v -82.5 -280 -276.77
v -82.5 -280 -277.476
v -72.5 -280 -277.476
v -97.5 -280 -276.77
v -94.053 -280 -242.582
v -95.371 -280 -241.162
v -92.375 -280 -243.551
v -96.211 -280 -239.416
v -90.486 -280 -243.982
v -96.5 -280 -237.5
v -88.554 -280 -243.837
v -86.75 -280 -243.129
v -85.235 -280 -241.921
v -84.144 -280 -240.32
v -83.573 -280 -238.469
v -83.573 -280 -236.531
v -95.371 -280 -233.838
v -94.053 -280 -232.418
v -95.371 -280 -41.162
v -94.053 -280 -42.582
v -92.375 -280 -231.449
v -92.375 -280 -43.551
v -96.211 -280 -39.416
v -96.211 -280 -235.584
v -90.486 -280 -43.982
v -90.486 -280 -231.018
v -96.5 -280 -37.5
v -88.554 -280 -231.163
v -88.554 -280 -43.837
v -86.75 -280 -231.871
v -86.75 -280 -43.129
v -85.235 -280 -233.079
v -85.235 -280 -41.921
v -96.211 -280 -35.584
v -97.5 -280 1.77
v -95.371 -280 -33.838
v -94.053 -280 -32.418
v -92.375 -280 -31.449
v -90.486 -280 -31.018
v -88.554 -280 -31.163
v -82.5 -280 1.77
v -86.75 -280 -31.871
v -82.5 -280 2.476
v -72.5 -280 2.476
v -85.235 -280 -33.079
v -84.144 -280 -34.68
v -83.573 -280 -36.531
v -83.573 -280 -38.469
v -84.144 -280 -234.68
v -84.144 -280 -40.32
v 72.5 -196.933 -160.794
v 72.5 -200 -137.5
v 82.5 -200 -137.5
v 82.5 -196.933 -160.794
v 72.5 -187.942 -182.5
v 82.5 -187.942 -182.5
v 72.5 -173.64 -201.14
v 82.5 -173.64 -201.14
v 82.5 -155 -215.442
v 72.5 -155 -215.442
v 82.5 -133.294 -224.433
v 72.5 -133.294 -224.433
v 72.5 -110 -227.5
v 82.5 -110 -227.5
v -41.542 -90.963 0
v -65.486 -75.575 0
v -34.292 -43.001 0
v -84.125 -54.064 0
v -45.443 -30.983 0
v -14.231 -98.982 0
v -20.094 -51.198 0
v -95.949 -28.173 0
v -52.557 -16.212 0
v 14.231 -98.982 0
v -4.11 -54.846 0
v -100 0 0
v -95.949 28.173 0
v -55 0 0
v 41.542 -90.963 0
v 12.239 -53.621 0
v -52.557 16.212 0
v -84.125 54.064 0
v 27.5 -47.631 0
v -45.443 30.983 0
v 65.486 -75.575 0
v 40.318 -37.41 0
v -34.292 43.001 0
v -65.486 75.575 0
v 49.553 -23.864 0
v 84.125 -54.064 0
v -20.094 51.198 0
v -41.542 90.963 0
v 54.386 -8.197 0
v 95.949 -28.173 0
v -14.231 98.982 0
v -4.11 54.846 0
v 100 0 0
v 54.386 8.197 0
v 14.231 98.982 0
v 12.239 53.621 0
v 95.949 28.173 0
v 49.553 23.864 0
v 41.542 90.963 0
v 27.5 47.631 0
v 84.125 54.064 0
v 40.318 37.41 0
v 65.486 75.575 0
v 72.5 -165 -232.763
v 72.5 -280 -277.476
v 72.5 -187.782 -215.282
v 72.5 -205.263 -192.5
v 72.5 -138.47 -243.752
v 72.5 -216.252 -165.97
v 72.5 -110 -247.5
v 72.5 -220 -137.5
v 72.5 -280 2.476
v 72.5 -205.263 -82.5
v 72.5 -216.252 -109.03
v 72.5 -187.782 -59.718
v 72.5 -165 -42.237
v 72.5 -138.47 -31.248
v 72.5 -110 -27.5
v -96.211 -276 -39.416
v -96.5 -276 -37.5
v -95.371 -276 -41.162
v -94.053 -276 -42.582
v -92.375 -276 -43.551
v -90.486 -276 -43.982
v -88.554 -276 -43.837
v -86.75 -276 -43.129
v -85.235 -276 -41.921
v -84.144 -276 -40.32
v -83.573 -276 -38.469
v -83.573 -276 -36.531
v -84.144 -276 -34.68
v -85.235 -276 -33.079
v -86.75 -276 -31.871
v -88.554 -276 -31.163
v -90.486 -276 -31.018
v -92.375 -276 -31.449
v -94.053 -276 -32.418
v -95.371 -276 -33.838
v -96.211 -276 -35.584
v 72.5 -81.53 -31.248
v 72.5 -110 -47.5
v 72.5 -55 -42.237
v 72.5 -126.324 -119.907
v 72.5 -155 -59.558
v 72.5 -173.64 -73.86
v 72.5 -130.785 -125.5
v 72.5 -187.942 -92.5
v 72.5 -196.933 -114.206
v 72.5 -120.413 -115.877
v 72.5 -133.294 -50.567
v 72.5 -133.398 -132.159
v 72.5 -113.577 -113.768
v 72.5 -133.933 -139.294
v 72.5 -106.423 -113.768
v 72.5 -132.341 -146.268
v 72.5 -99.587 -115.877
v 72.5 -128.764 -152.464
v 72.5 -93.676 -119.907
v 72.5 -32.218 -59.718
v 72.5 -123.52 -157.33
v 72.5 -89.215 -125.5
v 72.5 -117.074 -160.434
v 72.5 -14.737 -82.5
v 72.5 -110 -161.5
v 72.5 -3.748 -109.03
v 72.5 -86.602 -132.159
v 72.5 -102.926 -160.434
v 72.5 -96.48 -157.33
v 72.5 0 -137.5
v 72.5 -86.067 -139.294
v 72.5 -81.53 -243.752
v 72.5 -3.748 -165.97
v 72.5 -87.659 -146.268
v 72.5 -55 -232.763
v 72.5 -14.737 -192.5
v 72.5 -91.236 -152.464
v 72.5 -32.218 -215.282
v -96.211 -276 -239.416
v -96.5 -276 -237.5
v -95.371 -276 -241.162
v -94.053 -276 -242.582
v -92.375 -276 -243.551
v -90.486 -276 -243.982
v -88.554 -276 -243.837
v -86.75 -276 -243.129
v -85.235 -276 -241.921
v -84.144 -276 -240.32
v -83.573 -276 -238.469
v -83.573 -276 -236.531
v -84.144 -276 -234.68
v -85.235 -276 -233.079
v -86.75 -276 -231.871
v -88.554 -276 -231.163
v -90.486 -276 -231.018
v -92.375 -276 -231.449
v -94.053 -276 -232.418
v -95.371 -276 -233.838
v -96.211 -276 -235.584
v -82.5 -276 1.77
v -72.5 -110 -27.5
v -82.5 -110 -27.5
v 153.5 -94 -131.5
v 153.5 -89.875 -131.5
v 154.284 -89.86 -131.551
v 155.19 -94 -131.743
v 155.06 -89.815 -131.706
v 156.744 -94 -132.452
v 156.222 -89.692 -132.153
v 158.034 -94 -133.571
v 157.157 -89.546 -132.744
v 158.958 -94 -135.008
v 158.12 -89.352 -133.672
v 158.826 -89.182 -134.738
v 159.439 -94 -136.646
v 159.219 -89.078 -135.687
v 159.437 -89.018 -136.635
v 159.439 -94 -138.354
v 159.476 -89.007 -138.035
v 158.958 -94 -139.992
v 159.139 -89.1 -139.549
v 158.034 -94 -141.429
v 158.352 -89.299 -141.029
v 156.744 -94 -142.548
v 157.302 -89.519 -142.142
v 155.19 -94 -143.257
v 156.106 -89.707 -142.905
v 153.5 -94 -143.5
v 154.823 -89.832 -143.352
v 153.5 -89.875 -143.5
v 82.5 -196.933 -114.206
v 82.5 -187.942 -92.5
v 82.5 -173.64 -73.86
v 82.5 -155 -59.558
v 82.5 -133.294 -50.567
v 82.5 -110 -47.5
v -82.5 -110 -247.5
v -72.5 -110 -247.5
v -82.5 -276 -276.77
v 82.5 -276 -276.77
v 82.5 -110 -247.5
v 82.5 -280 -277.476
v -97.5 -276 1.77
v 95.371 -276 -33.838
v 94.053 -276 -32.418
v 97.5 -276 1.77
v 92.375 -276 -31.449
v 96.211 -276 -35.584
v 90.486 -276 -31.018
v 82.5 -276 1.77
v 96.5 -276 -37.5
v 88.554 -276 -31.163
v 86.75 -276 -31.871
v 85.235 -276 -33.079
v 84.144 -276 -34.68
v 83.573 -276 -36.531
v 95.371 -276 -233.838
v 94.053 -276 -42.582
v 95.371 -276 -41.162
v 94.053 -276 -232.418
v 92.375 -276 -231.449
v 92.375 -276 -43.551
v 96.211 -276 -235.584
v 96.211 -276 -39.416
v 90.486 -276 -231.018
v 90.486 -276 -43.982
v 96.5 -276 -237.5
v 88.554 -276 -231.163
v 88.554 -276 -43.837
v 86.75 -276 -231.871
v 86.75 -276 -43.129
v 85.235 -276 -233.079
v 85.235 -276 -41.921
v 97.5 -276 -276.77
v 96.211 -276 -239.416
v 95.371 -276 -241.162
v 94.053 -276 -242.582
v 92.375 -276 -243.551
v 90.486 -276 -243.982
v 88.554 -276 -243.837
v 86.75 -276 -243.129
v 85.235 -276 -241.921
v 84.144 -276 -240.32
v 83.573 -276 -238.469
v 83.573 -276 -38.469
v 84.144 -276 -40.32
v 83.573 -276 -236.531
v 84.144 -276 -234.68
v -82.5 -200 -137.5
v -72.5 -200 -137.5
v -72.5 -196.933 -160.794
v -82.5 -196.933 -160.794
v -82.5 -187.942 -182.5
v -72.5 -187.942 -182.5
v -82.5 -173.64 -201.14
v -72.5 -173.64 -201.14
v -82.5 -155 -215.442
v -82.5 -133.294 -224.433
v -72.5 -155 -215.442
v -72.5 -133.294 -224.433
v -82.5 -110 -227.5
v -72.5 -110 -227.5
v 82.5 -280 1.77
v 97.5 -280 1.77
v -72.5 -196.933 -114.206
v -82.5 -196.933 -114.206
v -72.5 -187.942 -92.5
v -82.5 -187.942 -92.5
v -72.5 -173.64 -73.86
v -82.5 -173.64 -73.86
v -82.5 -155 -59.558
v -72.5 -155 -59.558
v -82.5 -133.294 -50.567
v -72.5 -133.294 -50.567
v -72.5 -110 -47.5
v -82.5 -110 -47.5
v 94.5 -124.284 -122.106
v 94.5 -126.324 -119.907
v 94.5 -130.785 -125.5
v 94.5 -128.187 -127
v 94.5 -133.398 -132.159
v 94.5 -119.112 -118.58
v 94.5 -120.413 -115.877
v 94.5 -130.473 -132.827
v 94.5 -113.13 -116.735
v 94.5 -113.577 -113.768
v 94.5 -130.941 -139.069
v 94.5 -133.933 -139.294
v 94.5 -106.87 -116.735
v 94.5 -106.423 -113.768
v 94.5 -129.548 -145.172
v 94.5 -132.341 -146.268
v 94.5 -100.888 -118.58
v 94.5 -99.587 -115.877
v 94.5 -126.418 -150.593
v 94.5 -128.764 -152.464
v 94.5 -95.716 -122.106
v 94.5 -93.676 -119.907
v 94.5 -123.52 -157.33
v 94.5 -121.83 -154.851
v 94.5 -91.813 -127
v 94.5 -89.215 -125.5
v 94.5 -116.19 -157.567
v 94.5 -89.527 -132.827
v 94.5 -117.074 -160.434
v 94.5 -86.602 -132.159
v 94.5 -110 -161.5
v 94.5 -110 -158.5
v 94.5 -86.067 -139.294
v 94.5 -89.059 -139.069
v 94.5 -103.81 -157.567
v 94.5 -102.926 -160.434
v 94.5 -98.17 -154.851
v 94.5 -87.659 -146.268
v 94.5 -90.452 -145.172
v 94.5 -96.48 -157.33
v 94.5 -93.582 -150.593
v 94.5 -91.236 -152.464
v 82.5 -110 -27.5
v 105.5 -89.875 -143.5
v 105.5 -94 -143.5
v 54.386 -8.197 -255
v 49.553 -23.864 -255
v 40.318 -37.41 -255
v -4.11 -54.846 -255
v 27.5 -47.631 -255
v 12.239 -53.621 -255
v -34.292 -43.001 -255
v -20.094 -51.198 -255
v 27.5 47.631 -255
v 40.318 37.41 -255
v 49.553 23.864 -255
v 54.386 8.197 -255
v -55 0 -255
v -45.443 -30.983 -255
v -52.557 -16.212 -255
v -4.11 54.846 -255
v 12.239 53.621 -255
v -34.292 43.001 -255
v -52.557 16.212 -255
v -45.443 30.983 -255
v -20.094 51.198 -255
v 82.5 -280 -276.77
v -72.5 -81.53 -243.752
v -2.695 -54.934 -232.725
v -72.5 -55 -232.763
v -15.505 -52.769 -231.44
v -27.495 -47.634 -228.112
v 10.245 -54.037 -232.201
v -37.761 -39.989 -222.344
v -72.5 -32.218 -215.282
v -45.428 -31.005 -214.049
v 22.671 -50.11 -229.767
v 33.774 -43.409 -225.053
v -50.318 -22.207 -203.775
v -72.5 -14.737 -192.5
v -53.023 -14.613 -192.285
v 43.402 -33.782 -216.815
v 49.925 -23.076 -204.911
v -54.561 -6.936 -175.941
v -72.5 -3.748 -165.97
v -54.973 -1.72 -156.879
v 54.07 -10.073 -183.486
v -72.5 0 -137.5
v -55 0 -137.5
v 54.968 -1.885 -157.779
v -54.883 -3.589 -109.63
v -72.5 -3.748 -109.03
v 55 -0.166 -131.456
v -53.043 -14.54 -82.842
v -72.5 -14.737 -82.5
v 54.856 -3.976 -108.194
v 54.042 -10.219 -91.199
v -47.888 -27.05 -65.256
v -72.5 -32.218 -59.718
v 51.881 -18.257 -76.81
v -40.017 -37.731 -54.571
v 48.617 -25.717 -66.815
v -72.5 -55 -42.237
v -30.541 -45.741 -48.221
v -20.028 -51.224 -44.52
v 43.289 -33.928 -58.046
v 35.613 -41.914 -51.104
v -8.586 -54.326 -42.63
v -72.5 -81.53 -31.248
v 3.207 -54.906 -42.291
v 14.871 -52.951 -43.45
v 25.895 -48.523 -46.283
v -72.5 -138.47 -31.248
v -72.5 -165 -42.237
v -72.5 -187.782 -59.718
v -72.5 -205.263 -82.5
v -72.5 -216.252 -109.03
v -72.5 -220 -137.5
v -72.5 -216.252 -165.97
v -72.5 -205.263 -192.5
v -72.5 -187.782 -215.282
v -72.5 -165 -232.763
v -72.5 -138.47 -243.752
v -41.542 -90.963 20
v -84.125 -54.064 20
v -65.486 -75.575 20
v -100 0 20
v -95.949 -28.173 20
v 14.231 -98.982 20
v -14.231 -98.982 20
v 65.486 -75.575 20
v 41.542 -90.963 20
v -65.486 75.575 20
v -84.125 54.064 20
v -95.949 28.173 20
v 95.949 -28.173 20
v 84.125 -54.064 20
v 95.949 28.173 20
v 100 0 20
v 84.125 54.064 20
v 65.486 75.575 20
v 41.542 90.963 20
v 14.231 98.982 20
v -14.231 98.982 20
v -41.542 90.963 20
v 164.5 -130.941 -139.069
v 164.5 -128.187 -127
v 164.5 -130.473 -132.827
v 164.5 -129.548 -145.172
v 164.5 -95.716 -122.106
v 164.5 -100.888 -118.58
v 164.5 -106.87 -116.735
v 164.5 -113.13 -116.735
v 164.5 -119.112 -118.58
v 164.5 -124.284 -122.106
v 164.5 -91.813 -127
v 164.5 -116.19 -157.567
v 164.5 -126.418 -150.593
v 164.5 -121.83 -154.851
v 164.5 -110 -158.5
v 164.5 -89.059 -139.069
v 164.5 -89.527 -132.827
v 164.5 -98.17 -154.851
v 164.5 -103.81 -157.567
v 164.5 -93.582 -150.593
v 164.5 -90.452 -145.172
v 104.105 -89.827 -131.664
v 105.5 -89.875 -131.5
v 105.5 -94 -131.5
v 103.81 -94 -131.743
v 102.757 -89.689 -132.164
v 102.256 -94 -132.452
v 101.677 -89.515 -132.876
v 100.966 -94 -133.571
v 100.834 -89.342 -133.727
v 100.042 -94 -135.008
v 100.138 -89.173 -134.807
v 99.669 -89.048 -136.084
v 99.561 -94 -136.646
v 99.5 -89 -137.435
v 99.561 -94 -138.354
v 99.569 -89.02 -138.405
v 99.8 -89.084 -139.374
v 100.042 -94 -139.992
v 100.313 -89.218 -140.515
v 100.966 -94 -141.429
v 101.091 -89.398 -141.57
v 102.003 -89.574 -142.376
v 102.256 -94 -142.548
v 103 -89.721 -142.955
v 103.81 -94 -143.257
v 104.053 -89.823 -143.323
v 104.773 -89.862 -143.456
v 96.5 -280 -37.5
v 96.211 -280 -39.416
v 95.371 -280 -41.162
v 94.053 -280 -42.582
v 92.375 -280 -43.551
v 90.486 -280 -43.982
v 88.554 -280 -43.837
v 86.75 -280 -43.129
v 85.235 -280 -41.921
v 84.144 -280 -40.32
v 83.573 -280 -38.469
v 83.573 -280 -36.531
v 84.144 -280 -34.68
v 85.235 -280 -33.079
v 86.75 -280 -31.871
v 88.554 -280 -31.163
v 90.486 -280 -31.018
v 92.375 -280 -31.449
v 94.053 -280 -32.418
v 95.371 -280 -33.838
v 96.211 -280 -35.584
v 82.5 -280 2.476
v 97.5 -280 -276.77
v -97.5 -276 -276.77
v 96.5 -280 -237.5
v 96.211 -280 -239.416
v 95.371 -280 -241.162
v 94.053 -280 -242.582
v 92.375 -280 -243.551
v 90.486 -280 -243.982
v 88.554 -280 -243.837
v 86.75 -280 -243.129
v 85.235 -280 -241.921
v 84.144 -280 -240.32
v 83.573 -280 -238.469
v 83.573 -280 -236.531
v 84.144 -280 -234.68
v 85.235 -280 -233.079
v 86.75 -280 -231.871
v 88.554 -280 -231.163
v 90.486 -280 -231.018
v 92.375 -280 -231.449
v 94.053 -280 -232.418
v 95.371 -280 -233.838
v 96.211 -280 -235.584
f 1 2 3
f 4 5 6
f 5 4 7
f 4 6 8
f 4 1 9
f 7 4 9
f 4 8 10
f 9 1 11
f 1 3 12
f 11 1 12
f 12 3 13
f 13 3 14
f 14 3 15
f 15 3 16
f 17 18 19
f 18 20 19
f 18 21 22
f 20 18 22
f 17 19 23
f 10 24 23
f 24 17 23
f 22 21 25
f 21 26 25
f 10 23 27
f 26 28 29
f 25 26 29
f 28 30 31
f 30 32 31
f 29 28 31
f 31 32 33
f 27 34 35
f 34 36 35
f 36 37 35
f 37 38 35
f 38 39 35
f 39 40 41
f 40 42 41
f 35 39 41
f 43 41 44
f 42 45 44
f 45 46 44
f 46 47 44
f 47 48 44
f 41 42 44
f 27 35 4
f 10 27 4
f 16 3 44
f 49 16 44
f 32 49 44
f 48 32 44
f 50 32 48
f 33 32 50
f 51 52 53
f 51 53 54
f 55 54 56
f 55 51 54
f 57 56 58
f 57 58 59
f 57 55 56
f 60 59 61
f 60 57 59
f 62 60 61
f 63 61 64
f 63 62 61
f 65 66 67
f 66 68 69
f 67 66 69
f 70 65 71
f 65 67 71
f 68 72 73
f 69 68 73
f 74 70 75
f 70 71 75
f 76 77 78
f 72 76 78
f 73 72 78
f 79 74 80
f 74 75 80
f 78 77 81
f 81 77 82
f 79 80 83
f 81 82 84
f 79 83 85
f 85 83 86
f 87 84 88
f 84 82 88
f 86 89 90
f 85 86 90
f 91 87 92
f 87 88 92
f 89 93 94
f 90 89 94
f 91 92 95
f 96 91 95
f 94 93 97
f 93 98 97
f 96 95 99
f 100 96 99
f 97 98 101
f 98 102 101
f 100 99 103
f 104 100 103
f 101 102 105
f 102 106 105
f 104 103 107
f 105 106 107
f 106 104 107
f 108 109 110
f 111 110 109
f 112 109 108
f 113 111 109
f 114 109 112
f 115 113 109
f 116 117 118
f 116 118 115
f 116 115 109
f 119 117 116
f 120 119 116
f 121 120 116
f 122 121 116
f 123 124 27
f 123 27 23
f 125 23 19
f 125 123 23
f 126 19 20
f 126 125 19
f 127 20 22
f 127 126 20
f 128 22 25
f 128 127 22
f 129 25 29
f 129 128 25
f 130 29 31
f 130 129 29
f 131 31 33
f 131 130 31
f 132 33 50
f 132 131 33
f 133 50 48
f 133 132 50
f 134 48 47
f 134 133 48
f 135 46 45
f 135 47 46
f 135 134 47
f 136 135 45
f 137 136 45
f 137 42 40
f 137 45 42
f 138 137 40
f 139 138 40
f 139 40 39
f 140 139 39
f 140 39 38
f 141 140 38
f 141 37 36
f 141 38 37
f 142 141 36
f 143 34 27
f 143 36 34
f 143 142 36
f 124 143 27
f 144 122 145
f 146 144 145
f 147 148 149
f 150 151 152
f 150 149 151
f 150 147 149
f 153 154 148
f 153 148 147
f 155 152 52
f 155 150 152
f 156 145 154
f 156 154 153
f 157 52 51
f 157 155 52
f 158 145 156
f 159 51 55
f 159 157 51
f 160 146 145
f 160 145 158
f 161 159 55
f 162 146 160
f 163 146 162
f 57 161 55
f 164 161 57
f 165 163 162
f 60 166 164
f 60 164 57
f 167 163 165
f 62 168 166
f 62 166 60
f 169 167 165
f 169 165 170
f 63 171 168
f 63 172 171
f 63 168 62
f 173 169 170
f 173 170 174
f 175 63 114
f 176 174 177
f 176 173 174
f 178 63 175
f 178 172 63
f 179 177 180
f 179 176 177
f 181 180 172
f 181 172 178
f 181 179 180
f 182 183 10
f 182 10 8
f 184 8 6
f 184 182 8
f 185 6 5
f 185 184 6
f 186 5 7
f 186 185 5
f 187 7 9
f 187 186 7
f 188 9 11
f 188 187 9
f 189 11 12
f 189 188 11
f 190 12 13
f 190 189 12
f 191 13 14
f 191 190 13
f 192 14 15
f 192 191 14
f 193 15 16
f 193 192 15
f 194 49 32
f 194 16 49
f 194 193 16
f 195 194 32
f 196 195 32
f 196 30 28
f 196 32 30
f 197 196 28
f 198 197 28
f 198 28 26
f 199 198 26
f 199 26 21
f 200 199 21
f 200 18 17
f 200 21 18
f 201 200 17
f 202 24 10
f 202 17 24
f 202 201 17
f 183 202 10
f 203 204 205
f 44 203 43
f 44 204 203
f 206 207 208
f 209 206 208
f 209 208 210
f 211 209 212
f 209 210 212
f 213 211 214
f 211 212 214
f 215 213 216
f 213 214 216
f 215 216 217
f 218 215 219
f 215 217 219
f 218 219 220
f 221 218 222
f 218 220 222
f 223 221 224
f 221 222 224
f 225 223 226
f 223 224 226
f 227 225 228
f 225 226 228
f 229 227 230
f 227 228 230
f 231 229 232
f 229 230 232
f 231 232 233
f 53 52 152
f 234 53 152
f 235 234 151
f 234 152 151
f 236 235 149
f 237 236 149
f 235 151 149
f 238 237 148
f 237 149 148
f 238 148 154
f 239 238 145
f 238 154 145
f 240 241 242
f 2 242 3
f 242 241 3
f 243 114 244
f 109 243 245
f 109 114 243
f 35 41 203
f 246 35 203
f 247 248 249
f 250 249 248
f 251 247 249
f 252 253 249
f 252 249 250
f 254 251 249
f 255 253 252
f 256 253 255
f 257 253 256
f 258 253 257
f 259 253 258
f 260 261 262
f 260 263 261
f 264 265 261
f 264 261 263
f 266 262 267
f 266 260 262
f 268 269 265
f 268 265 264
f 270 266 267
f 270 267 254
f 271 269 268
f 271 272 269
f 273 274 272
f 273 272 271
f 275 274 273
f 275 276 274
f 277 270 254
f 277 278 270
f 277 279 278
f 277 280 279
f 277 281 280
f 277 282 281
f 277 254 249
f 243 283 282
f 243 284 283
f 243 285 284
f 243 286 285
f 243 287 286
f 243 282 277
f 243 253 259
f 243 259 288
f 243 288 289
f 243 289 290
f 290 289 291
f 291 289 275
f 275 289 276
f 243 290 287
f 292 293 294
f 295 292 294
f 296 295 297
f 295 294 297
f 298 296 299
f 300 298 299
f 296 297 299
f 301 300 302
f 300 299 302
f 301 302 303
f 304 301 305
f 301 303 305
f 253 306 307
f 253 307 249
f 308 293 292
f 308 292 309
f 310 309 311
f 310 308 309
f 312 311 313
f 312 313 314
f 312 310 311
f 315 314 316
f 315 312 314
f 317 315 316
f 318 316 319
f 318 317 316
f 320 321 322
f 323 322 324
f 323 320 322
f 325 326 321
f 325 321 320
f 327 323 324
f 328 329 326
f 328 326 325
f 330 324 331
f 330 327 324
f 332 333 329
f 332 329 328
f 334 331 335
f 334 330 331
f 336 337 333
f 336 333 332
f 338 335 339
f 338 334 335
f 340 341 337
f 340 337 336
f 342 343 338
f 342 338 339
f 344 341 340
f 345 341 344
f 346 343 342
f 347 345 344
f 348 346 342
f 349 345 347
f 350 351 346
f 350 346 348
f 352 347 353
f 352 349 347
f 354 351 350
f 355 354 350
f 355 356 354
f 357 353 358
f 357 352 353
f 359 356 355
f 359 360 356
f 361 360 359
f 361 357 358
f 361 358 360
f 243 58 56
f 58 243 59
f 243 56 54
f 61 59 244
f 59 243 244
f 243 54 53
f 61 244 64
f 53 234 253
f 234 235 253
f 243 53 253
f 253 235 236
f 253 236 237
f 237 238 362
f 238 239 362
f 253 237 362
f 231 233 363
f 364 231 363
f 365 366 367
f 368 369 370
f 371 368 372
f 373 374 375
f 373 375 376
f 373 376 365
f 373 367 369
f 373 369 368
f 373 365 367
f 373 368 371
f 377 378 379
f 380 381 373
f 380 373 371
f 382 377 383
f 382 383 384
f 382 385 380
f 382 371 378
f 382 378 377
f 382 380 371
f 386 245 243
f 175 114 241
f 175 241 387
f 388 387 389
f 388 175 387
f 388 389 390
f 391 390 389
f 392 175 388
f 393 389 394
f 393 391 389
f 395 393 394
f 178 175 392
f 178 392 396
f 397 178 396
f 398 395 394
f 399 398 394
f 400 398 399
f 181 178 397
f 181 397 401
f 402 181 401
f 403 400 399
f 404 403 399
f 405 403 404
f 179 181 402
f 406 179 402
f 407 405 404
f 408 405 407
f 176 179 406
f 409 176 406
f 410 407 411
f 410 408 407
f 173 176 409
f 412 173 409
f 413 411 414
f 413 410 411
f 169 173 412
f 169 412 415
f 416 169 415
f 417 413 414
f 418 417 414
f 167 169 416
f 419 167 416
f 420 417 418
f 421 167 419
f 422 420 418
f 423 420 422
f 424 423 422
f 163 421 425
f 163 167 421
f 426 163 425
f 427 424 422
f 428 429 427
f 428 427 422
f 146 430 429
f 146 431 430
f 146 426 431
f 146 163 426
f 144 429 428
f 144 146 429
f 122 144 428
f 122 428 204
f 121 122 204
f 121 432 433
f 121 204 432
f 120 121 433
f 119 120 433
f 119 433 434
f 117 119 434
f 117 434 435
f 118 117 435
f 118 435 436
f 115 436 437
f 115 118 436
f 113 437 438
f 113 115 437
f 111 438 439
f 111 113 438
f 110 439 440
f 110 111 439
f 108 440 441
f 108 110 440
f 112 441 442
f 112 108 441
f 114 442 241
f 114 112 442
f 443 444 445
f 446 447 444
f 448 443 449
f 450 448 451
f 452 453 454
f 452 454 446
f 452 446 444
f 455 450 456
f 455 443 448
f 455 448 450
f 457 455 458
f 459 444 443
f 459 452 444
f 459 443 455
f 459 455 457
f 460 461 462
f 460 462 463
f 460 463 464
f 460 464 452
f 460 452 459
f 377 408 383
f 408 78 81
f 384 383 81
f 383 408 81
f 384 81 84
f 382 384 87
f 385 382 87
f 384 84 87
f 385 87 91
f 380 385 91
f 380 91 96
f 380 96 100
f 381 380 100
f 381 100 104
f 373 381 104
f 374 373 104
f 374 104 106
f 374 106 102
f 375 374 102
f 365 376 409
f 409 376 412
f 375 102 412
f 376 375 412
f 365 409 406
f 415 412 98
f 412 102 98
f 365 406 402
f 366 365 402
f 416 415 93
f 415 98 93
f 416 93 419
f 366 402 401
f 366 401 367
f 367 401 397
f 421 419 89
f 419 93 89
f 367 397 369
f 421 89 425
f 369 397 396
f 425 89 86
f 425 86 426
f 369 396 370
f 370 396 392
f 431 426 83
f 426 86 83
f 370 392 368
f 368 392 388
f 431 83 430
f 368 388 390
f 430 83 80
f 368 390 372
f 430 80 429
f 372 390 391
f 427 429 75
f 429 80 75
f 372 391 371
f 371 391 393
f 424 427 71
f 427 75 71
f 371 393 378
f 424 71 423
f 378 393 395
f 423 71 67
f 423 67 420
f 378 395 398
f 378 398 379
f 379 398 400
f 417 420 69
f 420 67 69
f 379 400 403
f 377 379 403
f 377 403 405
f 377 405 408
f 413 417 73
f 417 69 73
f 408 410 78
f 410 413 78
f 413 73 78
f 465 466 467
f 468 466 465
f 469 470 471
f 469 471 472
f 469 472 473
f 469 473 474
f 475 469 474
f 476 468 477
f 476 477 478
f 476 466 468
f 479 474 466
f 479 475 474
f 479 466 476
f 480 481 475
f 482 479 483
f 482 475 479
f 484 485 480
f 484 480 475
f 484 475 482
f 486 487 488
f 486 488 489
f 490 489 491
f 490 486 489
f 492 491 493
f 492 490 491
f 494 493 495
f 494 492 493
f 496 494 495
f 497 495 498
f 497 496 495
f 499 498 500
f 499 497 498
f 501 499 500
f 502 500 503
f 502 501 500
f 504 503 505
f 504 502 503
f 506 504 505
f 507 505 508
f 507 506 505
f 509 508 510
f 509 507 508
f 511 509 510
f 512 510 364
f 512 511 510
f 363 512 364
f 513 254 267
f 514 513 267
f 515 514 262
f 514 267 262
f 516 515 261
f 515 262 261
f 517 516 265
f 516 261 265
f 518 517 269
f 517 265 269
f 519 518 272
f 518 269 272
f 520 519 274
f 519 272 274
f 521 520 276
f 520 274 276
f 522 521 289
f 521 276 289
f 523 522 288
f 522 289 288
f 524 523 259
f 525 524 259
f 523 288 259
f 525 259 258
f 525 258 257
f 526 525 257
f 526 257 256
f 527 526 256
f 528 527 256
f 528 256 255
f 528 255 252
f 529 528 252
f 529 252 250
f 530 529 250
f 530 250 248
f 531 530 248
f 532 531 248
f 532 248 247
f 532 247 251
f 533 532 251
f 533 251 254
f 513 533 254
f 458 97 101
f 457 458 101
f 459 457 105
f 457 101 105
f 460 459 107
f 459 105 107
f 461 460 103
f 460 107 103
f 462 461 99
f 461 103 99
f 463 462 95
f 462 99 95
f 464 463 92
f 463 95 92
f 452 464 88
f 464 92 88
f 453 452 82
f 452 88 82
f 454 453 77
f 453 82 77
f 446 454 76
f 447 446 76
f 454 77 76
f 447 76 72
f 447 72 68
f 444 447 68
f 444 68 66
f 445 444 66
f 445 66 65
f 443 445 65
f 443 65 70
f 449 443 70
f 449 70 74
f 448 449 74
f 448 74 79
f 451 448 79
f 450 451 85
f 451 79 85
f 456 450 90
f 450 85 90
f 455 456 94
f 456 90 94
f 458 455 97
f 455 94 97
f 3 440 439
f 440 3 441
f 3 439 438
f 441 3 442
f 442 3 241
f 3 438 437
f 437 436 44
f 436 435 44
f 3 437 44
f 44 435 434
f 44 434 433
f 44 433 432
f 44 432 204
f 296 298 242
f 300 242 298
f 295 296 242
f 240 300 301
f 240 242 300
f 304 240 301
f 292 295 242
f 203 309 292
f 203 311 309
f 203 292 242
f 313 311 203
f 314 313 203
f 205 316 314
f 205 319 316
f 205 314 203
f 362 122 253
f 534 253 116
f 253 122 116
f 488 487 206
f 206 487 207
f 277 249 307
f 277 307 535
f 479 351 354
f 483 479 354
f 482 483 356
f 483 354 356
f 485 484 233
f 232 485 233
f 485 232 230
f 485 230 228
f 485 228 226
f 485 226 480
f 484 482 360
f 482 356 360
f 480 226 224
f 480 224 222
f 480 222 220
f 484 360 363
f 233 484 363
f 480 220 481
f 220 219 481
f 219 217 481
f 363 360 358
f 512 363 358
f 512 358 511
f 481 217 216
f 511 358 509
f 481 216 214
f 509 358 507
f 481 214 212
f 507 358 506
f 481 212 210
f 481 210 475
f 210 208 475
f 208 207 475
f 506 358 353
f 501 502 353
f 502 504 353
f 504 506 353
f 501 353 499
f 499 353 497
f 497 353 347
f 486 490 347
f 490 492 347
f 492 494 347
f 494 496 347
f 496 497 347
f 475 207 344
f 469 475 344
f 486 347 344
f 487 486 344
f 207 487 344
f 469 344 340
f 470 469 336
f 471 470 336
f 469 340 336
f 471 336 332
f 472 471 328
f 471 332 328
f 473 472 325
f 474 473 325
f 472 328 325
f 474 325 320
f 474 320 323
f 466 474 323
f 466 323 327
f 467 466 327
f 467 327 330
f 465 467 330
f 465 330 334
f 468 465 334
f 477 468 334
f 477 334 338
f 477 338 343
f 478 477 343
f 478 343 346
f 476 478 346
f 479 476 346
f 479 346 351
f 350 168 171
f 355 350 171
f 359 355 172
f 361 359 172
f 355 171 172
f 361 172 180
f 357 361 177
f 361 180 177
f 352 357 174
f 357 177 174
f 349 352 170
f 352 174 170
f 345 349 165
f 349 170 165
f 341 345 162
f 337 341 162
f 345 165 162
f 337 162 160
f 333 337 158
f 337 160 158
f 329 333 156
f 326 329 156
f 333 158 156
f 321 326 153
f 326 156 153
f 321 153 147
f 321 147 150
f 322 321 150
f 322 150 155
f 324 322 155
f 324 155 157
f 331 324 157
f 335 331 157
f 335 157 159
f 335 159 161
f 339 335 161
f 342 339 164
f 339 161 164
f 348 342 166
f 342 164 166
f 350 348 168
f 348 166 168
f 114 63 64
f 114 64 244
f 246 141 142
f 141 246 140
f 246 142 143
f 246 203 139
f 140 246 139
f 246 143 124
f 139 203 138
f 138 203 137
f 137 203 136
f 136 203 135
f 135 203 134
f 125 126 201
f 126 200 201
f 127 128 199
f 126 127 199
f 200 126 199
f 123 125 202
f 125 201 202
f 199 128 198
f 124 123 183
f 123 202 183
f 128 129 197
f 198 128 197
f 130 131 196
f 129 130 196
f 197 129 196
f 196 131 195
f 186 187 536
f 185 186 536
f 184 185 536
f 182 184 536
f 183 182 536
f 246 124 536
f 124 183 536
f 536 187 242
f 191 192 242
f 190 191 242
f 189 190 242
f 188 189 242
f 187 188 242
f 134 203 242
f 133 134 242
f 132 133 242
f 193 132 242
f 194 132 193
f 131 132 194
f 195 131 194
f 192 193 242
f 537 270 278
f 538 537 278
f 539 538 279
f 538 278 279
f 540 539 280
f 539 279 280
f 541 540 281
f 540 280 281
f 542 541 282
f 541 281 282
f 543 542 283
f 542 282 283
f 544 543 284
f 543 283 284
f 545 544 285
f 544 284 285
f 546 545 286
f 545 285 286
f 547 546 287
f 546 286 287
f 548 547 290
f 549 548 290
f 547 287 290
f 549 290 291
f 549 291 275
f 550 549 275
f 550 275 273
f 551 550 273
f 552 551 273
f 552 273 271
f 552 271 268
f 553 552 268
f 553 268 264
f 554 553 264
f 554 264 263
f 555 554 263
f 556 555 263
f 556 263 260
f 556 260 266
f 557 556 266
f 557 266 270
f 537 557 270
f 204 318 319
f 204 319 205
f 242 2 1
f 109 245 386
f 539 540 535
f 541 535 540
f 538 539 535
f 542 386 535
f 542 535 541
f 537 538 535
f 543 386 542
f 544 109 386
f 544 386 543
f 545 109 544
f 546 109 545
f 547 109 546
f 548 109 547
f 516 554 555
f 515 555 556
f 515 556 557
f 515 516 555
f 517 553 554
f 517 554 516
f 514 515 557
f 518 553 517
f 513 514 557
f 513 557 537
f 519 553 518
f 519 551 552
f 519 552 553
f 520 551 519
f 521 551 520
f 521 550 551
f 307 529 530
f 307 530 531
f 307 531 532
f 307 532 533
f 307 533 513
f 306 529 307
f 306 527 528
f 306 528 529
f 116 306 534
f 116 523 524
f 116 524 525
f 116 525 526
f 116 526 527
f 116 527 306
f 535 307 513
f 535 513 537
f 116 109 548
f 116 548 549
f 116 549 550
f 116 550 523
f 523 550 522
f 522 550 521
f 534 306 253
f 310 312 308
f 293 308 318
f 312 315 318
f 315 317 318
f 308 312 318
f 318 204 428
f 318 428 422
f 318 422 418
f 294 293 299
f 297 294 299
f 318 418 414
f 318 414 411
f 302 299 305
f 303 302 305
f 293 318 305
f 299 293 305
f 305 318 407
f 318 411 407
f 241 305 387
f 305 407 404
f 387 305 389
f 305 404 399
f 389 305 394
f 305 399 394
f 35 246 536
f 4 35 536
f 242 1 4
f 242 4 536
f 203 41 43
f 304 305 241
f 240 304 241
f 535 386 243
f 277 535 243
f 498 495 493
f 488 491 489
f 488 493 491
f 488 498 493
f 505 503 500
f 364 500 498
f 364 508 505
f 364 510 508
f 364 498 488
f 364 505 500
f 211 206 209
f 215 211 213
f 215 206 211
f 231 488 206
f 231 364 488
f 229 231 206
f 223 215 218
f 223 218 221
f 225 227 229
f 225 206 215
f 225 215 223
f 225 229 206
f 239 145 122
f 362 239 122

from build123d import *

# Parameters (mm, degrees)
SKETCH1_R                  = 100
BOSS_EXTRUDE1_DEPTH        = 20
SKETCH2_R                  = 55
BOSS_EXTRUDE2_DEPTH        = 255
SKETCH3_R                  = 110
BOSS_EXTRUDE3_DEPTH        = 72.5
BOSS_EXTRUDE4_DEPTH        = 10
MIRROR4_COPY_1_DEPTH       = 10
MIRROR4_COPY_2_DEPTH       = 10
SKETCH5_R                  = 21
BOSS_EXTRUDE5_DEPTH        = 92
SKETCH7_R                  = 24
BOSS_EXTRUDE6_DEPTH        = 22
CUT_EXTRUDE1_DEPTH         = 5
SKETCH8_W                  = 278.540557596
SKETCH8_H                  = 4
BOSS_EXTRUDE7_DEPTH        = 15
F_13_0_13_DIAMETER_HOLE1_D = 13


with BuildPart() as part:
    # Sketch1 → Boss-Extrude1 (new body)
    with BuildSketch(Plane.XY):
        Circle(SKETCH1_R)
    extrude(amount=BOSS_EXTRUDE1_DEPTH)

    # Sketch2 → Boss-Extrude2 (add)
    with BuildSketch(Plane(origin=(0, 0, 0), x_dir=(-1, 0, 0), z_dir=(0, 0, -1))):
        Circle(SKETCH2_R)
    extrude(amount=BOSS_EXTRUDE2_DEPTH)

    # Sketch3 → Boss-Extrude3 (add, symmetric)
    with BuildSketch(Plane(origin=(0, 0, 0), x_dir=(0, 0, -1), z_dir=(1, 0, 0))):
        with Locations((137.5, -110)):
            Circle(SKETCH3_R)
    extrude(amount=BOSS_EXTRUDE3_DEPTH, both=True)

    # Sketch4 → Boss-Extrude4 (add)
    with BuildSketch(Plane(origin=(72.5, 0, 0), x_dir=(0, 0, -1), z_dir=(1, 0, 0))):
        with BuildLine():
            Line((-2.47558672, -280), (137.5, -280))
            Line((137.5, -280), (137.5, -200))
            ThreePointArc((137.5, -200), (73.860389693, -173.639610307), (47.5, -110))
            Line((47.5, -110), (27.5, -110))
            Line((27.5, -110), (-2.47558672, -280))
        make_face()
    boss_extrude4 = extrude(amount=BOSS_EXTRUDE4_DEPTH)

    # Mirror1: Boss-Extrude4 across plane
    add(boss_extrude4.mirror(Plane(origin=(82.5, 0, -137.5), x_dir=(1, 0, 0), z_dir=(0, 0, 1))))

    # Mirror3: Boss-Extrude4 across plane
    add(boss_extrude4.mirror(Plane(origin=(0, 0, 0), x_dir=(0, 0, 1), z_dir=(1, 0, 0))))

    # Mirror4 copy 1 sketch → Mirror4 copy 1 (add)
    with BuildSketch(Plane(origin=(-72.5, 0, -275), x_dir=(0, 0, 1), z_dir=(-1, 0, 0))):
        with BuildLine():
            Line((-2.47558672, -280), (137.5, -280))
            Line((137.5, -280), (137.5, -200))
            ThreePointArc((137.5, -200), (73.860389693, -173.639610307), (47.5, -110))
            Line((47.5, -110), (27.5, -110))
            Line((27.5, -110), (-2.47558672, -280))
        make_face()
    extrude(amount=MIRROR4_COPY_1_DEPTH)

    # Mirror4 copy 2 sketch → Mirror4 copy 2 (add)
    with BuildSketch(Plane(origin=(72.5, 0, -275), x_dir=(0, 0, 1), z_dir=(1, 0, 0))):
        with BuildLine():
            Line((-2.47558672, 280), (137.5, 280))
            Line((137.5, 280), (137.5, 200))
            ThreePointArc((137.5, 200), (73.860389693, 173.639610307), (47.5, 110))
            Line((47.5, 110), (27.5, 110))
            Line((27.5, 110), (-2.47558672, 280))
        make_face()
    extrude(amount=MIRROR4_COPY_2_DEPTH)

    # Sketch5 → Boss-Extrude5 (add)
    with BuildSketch(Plane(origin=(72.5, 0, 0), x_dir=(0, 0, -1), z_dir=(1, 0, 0))):
        with Locations((137.5, -110)):
            Circle(SKETCH5_R)
    extrude(amount=BOSS_EXTRUDE5_DEPTH)

    # Sketch7 → Boss-Extrude6 (add)
    with BuildSketch(Plane(origin=(72.5, 0, 0), x_dir=(0, 0, -1), z_dir=(1, 0, 0))):
        with Locations((137.5, -110)):
            Circle(SKETCH7_R)
    extrude(amount=BOSS_EXTRUDE6_DEPTH)

    # Sketch6 → Cut-Extrude1 (cut)
    with BuildSketch(Plane(origin=(0, -89, 0), x_dir=(1, 0, 0), z_dir=(0, 1, 0))):
        with BuildLine():
            Line((105.5, 143.5), (129.5, 143.5))
            Line((129.5, 143.5), (129.5, 131.5))
            Line((129.5, 131.5), (105.5, 131.5))
            ThreePointArc((105.5, 131.5), (99.5, 137.5), (105.5, 143.5))
        make_face()
    cut_extrude1 = extrude(amount=-CUT_EXTRUDE1_DEPTH, mode=Mode.SUBTRACT)

    # Mirror5: Cut-Extrude1 across plane
    add(cut_extrude1.mirror(Plane(origin=(129.5, -94, -143.5), x_dir=(0, 0, 1), z_dir=(1, 0, 0))), mode=Mode.SUBTRACT)

    # Sketch8 → Boss-Extrude7 (add)
    with BuildSketch(Plane(origin=(82.5, 0, 0), x_dir=(0, 0, -1), z_dir=(1, 0, 0))):
        with Locations((137.5, -278)):
            Rectangle(SKETCH8_W, SKETCH8_H)
    boss_extrude7 = extrude(amount=BOSS_EXTRUDE7_DEPTH)

    # Ø13.0 (13) Diameter Hole1 (through all)
    with Locations(Plane(origin=(0, -280, 0), x_dir=(-1, 0, 0), z_dir=(0, -1, 0))):
        with Locations((-90, 37.5), (-90, 237.5)):
            f_13_0_13_diameter_hole1 = Hole(F_13_0_13_DIAMETER_HOLE1_D / 2)

    # Mirror8: Boss-Extrude7, Ø13.0 (13) Diameter Hole1 across plane
    add(boss_extrude7.mirror(Plane(origin=(0, 0, 0), x_dir=(0, 0, 1), z_dir=(1, 0, 0))))
    add(f_13_0_13_diameter_hole1.mirror(Plane(origin=(0, 0, 0), x_dir=(0, 0, 1), z_dir=(1, 0, 0))), mode=Mode.SUBTRACT)


solid = part.part
